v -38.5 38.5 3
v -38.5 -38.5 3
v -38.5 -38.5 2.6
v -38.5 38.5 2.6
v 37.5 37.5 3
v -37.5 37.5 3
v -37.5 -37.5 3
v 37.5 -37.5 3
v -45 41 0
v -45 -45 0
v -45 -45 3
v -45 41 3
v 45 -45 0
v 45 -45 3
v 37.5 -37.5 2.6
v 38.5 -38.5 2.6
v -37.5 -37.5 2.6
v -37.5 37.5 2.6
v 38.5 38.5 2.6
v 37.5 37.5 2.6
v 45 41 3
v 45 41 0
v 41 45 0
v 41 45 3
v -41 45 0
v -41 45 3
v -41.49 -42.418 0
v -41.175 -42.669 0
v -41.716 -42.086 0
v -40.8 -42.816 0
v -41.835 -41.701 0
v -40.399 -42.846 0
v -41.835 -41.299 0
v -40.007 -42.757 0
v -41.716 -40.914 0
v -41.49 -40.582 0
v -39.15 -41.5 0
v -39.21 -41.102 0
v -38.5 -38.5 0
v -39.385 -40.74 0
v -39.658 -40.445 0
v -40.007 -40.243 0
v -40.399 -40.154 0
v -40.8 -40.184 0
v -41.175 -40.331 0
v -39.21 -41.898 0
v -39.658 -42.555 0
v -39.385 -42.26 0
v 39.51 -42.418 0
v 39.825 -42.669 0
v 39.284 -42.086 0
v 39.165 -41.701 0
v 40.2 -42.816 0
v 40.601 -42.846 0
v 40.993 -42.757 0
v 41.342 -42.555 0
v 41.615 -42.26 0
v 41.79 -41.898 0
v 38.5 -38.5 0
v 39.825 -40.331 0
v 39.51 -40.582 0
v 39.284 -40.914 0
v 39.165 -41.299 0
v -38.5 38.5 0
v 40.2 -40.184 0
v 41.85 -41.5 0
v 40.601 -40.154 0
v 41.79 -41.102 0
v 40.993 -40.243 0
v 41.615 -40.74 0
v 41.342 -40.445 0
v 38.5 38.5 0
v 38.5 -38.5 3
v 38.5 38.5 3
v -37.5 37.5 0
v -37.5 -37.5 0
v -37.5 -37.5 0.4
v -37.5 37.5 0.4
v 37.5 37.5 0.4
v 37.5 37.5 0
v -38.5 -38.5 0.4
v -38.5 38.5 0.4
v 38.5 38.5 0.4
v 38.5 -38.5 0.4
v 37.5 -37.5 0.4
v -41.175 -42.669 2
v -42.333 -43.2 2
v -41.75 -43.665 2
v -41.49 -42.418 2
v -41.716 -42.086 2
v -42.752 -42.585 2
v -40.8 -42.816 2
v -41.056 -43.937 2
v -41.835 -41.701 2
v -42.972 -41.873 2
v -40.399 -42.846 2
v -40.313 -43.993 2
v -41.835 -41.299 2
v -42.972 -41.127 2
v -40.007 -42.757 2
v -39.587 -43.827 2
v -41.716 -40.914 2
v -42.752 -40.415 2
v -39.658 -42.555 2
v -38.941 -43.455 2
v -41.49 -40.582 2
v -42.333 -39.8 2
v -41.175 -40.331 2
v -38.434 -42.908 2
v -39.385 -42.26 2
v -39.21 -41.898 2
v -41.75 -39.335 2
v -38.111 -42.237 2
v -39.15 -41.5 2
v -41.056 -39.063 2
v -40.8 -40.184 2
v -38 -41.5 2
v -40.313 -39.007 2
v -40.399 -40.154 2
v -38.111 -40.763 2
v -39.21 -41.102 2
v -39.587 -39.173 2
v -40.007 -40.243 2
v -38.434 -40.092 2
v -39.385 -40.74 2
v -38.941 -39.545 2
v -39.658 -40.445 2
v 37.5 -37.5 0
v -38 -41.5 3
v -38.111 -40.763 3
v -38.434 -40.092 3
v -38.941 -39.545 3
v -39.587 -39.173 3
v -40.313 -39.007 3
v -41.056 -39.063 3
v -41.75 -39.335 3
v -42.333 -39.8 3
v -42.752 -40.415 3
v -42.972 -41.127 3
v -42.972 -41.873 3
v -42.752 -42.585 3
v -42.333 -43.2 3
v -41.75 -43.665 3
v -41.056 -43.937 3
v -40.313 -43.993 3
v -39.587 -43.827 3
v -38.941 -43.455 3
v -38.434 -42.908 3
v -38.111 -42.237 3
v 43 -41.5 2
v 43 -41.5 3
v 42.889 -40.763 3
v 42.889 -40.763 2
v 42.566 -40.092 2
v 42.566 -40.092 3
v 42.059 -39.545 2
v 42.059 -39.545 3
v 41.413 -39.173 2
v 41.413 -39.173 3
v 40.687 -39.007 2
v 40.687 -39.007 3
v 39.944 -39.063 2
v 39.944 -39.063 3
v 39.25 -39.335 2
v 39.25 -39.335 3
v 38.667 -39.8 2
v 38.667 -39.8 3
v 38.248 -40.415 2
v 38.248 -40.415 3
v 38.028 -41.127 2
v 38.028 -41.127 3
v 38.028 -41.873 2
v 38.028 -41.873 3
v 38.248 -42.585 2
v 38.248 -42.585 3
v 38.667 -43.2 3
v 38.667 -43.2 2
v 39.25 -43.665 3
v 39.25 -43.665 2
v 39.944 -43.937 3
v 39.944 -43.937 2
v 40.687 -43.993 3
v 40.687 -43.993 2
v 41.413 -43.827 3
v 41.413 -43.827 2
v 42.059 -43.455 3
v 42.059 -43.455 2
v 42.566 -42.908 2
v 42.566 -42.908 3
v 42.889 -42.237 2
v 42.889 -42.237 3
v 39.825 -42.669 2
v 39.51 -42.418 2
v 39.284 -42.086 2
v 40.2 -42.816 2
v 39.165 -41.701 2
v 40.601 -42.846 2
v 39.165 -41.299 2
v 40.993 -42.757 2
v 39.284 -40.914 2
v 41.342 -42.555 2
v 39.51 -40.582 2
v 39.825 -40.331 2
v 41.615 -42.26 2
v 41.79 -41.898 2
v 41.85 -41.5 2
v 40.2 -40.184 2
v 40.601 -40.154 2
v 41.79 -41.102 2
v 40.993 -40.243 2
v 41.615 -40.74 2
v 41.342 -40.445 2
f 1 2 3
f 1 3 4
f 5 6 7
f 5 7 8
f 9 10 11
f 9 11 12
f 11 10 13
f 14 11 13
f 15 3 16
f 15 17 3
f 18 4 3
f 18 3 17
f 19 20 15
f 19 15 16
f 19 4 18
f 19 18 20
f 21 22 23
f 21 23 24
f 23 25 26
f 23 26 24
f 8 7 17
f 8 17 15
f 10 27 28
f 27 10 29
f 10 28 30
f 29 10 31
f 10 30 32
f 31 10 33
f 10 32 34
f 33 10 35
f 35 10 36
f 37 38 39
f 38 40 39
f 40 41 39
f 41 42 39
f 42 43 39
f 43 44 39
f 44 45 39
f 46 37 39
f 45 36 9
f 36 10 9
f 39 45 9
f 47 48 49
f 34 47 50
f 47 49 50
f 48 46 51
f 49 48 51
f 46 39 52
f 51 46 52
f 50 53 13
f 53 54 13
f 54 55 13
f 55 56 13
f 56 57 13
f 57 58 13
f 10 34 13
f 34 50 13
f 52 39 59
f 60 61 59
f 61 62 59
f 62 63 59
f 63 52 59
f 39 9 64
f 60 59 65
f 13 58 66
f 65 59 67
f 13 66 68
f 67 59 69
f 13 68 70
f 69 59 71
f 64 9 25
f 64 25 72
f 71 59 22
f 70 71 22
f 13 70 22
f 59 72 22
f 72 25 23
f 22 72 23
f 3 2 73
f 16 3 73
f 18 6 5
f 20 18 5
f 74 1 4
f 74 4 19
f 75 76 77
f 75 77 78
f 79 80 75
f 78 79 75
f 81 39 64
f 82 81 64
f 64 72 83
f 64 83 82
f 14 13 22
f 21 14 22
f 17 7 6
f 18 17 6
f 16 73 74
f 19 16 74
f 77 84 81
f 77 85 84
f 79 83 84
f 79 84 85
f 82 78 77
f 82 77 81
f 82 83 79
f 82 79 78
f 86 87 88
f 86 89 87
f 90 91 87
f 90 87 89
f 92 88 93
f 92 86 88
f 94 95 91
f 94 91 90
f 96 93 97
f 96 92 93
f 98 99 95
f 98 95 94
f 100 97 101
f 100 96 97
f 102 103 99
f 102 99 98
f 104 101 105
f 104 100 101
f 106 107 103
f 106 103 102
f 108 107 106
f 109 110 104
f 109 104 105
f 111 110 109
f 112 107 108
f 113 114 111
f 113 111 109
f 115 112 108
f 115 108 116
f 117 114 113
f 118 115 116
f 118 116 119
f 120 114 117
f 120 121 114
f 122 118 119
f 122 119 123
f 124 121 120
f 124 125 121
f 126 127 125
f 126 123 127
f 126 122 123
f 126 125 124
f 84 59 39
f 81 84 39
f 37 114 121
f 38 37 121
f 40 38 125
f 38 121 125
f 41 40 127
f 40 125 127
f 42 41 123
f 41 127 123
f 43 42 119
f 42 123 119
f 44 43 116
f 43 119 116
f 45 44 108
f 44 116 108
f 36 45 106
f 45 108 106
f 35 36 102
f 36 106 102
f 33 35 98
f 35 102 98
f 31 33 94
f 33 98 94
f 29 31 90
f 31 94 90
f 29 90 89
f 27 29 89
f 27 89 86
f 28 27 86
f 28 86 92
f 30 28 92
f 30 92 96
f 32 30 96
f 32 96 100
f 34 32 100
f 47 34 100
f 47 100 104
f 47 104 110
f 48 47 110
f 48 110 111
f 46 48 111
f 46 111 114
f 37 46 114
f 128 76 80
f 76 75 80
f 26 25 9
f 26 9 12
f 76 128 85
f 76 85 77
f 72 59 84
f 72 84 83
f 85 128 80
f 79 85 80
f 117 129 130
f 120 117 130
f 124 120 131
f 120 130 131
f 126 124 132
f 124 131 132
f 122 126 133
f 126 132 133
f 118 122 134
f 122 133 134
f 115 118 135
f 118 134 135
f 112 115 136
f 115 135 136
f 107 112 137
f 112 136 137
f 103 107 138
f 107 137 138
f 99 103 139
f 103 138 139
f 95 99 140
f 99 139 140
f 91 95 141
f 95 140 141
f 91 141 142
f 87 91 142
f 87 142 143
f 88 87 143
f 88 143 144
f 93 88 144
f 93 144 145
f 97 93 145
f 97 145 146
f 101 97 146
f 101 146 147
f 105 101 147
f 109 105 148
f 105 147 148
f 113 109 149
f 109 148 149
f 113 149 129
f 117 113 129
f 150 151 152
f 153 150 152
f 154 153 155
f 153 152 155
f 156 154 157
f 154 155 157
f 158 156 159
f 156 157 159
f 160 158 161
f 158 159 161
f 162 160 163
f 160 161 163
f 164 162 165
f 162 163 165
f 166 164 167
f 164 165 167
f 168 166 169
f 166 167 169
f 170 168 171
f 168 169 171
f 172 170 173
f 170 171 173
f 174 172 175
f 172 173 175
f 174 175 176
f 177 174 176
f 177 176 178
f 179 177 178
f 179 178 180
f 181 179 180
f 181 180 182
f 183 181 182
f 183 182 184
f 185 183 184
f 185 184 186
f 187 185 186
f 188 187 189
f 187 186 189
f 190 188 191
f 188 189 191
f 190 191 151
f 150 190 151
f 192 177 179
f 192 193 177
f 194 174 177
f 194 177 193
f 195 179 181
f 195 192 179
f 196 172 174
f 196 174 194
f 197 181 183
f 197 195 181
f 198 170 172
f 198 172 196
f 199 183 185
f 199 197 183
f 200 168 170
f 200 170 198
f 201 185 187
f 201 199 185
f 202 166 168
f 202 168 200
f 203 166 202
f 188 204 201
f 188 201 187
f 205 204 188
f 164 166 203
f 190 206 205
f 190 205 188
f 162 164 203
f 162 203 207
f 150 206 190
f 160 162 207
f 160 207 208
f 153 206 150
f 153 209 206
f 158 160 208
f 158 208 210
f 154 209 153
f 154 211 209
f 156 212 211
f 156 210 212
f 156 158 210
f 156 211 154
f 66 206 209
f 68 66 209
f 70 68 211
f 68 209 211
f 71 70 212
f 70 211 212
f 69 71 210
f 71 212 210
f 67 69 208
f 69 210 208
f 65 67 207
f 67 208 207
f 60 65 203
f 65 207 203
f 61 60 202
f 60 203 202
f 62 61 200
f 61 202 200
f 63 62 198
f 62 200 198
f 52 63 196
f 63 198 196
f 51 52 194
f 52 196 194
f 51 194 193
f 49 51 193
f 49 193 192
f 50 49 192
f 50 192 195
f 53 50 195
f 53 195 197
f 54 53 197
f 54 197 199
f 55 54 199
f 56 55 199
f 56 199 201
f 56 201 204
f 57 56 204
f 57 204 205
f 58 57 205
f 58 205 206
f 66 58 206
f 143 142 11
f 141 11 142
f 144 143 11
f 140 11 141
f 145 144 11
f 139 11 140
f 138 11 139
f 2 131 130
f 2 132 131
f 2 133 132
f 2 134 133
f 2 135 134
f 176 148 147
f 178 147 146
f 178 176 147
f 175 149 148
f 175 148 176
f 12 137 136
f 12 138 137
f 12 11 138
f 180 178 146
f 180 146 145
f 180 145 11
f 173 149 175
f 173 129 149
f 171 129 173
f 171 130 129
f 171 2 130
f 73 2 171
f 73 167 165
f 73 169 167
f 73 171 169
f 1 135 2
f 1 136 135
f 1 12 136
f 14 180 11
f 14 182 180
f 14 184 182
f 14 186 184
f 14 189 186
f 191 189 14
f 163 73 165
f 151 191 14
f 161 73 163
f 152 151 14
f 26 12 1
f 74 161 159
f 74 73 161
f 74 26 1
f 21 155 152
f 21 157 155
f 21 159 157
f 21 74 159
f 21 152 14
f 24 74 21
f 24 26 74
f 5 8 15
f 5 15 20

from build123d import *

# Parameters (mm, degrees)
SKETCH1_W           = 90
SKETCH1_H           = 90
BOSS_EXTRUDE1_DEPTH = 3
SKETCH2_R           = 1.35
CUT_EXTRUDE1_DEPTH  = 4
SKETCH3_W           = 77
SKETCH3_H           = 77
SKETCH3_W_2         = 75
SKETCH3_H_2         = 75
CUT_EXTRUDE2_DEPTH  = 0.4
SKETCH4_W           = 77
SKETCH4_H           = 77
SKETCH4_W_2         = 75
SKETCH4_H_2         = 75
CUT_EXTRUDE3_DEPTH  = 0.4
CHAMFER1_SIZE       = 4
SKETCH5_R           = 2.5
CUT_EXTRUDE4_DEPTH  = 1


with BuildPart() as part:
    # Sketch1 → Boss-Extrude1 (new body)
    with BuildSketch(Plane.XY):
        Rectangle(SKETCH1_W, SKETCH1_H)
    extrude(amount=BOSS_EXTRUDE1_DEPTH)

    # Sketch2 → Cut-Extrude1 (cut, through all)
    with BuildSketch(Plane.XY.offset(3)):
        with Locations((-40.5, -41.5)):
            Circle(SKETCH2_R)
        with Locations((40.5, -41.5)):
            Circle(SKETCH2_R)
    extrude(amount=-CUT_EXTRUDE1_DEPTH, mode=Mode.SUBTRACT)

    # Sketch3 → Cut-Extrude2 (cut)
    with BuildSketch(Plane.XY.offset(3)):
        Rectangle(SKETCH3_W, SKETCH3_H)
        Rectangle(SKETCH3_W_2, SKETCH3_H_2, mode=Mode.SUBTRACT)
    extrude(amount=-CUT_EXTRUDE2_DEPTH, mode=Mode.SUBTRACT)

    # Sketch4 → Cut-Extrude3 (cut)
    with BuildSketch(Plane(origin=(0, 0, 0), x_dir=(-1, 0, 0), z_dir=(0, 0, -1))):
        Rectangle(SKETCH4_W, SKETCH4_H)
        Rectangle(SKETCH4_W_2, SKETCH4_H_2, mode=Mode.SUBTRACT)
    extrude(amount=-CUT_EXTRUDE3_DEPTH, mode=Mode.SUBTRACT)

    # Chamfer1
    chamfer1_edges = [part.edges().sort_by_distance(p)[0] for p in [
        (-45, 45, 1.5),
        (45, 45, 1.5),
    ]]
    chamfer(chamfer1_edges, length=CHAMFER1_SIZE)

    # Sketch5 → Cut-Extrude4 (cut)
    with BuildSketch(Plane.XY.offset(3)):
        with Locations((-40.5, -41.5)):
            Circle(SKETCH5_R)
        with Locations((40.5, -41.5)):
            Circle(SKETCH5_R)
    extrude(amount=-CUT_EXTRUDE4_DEPTH, mode=Mode.SUBTRACT)


solid = part.part
